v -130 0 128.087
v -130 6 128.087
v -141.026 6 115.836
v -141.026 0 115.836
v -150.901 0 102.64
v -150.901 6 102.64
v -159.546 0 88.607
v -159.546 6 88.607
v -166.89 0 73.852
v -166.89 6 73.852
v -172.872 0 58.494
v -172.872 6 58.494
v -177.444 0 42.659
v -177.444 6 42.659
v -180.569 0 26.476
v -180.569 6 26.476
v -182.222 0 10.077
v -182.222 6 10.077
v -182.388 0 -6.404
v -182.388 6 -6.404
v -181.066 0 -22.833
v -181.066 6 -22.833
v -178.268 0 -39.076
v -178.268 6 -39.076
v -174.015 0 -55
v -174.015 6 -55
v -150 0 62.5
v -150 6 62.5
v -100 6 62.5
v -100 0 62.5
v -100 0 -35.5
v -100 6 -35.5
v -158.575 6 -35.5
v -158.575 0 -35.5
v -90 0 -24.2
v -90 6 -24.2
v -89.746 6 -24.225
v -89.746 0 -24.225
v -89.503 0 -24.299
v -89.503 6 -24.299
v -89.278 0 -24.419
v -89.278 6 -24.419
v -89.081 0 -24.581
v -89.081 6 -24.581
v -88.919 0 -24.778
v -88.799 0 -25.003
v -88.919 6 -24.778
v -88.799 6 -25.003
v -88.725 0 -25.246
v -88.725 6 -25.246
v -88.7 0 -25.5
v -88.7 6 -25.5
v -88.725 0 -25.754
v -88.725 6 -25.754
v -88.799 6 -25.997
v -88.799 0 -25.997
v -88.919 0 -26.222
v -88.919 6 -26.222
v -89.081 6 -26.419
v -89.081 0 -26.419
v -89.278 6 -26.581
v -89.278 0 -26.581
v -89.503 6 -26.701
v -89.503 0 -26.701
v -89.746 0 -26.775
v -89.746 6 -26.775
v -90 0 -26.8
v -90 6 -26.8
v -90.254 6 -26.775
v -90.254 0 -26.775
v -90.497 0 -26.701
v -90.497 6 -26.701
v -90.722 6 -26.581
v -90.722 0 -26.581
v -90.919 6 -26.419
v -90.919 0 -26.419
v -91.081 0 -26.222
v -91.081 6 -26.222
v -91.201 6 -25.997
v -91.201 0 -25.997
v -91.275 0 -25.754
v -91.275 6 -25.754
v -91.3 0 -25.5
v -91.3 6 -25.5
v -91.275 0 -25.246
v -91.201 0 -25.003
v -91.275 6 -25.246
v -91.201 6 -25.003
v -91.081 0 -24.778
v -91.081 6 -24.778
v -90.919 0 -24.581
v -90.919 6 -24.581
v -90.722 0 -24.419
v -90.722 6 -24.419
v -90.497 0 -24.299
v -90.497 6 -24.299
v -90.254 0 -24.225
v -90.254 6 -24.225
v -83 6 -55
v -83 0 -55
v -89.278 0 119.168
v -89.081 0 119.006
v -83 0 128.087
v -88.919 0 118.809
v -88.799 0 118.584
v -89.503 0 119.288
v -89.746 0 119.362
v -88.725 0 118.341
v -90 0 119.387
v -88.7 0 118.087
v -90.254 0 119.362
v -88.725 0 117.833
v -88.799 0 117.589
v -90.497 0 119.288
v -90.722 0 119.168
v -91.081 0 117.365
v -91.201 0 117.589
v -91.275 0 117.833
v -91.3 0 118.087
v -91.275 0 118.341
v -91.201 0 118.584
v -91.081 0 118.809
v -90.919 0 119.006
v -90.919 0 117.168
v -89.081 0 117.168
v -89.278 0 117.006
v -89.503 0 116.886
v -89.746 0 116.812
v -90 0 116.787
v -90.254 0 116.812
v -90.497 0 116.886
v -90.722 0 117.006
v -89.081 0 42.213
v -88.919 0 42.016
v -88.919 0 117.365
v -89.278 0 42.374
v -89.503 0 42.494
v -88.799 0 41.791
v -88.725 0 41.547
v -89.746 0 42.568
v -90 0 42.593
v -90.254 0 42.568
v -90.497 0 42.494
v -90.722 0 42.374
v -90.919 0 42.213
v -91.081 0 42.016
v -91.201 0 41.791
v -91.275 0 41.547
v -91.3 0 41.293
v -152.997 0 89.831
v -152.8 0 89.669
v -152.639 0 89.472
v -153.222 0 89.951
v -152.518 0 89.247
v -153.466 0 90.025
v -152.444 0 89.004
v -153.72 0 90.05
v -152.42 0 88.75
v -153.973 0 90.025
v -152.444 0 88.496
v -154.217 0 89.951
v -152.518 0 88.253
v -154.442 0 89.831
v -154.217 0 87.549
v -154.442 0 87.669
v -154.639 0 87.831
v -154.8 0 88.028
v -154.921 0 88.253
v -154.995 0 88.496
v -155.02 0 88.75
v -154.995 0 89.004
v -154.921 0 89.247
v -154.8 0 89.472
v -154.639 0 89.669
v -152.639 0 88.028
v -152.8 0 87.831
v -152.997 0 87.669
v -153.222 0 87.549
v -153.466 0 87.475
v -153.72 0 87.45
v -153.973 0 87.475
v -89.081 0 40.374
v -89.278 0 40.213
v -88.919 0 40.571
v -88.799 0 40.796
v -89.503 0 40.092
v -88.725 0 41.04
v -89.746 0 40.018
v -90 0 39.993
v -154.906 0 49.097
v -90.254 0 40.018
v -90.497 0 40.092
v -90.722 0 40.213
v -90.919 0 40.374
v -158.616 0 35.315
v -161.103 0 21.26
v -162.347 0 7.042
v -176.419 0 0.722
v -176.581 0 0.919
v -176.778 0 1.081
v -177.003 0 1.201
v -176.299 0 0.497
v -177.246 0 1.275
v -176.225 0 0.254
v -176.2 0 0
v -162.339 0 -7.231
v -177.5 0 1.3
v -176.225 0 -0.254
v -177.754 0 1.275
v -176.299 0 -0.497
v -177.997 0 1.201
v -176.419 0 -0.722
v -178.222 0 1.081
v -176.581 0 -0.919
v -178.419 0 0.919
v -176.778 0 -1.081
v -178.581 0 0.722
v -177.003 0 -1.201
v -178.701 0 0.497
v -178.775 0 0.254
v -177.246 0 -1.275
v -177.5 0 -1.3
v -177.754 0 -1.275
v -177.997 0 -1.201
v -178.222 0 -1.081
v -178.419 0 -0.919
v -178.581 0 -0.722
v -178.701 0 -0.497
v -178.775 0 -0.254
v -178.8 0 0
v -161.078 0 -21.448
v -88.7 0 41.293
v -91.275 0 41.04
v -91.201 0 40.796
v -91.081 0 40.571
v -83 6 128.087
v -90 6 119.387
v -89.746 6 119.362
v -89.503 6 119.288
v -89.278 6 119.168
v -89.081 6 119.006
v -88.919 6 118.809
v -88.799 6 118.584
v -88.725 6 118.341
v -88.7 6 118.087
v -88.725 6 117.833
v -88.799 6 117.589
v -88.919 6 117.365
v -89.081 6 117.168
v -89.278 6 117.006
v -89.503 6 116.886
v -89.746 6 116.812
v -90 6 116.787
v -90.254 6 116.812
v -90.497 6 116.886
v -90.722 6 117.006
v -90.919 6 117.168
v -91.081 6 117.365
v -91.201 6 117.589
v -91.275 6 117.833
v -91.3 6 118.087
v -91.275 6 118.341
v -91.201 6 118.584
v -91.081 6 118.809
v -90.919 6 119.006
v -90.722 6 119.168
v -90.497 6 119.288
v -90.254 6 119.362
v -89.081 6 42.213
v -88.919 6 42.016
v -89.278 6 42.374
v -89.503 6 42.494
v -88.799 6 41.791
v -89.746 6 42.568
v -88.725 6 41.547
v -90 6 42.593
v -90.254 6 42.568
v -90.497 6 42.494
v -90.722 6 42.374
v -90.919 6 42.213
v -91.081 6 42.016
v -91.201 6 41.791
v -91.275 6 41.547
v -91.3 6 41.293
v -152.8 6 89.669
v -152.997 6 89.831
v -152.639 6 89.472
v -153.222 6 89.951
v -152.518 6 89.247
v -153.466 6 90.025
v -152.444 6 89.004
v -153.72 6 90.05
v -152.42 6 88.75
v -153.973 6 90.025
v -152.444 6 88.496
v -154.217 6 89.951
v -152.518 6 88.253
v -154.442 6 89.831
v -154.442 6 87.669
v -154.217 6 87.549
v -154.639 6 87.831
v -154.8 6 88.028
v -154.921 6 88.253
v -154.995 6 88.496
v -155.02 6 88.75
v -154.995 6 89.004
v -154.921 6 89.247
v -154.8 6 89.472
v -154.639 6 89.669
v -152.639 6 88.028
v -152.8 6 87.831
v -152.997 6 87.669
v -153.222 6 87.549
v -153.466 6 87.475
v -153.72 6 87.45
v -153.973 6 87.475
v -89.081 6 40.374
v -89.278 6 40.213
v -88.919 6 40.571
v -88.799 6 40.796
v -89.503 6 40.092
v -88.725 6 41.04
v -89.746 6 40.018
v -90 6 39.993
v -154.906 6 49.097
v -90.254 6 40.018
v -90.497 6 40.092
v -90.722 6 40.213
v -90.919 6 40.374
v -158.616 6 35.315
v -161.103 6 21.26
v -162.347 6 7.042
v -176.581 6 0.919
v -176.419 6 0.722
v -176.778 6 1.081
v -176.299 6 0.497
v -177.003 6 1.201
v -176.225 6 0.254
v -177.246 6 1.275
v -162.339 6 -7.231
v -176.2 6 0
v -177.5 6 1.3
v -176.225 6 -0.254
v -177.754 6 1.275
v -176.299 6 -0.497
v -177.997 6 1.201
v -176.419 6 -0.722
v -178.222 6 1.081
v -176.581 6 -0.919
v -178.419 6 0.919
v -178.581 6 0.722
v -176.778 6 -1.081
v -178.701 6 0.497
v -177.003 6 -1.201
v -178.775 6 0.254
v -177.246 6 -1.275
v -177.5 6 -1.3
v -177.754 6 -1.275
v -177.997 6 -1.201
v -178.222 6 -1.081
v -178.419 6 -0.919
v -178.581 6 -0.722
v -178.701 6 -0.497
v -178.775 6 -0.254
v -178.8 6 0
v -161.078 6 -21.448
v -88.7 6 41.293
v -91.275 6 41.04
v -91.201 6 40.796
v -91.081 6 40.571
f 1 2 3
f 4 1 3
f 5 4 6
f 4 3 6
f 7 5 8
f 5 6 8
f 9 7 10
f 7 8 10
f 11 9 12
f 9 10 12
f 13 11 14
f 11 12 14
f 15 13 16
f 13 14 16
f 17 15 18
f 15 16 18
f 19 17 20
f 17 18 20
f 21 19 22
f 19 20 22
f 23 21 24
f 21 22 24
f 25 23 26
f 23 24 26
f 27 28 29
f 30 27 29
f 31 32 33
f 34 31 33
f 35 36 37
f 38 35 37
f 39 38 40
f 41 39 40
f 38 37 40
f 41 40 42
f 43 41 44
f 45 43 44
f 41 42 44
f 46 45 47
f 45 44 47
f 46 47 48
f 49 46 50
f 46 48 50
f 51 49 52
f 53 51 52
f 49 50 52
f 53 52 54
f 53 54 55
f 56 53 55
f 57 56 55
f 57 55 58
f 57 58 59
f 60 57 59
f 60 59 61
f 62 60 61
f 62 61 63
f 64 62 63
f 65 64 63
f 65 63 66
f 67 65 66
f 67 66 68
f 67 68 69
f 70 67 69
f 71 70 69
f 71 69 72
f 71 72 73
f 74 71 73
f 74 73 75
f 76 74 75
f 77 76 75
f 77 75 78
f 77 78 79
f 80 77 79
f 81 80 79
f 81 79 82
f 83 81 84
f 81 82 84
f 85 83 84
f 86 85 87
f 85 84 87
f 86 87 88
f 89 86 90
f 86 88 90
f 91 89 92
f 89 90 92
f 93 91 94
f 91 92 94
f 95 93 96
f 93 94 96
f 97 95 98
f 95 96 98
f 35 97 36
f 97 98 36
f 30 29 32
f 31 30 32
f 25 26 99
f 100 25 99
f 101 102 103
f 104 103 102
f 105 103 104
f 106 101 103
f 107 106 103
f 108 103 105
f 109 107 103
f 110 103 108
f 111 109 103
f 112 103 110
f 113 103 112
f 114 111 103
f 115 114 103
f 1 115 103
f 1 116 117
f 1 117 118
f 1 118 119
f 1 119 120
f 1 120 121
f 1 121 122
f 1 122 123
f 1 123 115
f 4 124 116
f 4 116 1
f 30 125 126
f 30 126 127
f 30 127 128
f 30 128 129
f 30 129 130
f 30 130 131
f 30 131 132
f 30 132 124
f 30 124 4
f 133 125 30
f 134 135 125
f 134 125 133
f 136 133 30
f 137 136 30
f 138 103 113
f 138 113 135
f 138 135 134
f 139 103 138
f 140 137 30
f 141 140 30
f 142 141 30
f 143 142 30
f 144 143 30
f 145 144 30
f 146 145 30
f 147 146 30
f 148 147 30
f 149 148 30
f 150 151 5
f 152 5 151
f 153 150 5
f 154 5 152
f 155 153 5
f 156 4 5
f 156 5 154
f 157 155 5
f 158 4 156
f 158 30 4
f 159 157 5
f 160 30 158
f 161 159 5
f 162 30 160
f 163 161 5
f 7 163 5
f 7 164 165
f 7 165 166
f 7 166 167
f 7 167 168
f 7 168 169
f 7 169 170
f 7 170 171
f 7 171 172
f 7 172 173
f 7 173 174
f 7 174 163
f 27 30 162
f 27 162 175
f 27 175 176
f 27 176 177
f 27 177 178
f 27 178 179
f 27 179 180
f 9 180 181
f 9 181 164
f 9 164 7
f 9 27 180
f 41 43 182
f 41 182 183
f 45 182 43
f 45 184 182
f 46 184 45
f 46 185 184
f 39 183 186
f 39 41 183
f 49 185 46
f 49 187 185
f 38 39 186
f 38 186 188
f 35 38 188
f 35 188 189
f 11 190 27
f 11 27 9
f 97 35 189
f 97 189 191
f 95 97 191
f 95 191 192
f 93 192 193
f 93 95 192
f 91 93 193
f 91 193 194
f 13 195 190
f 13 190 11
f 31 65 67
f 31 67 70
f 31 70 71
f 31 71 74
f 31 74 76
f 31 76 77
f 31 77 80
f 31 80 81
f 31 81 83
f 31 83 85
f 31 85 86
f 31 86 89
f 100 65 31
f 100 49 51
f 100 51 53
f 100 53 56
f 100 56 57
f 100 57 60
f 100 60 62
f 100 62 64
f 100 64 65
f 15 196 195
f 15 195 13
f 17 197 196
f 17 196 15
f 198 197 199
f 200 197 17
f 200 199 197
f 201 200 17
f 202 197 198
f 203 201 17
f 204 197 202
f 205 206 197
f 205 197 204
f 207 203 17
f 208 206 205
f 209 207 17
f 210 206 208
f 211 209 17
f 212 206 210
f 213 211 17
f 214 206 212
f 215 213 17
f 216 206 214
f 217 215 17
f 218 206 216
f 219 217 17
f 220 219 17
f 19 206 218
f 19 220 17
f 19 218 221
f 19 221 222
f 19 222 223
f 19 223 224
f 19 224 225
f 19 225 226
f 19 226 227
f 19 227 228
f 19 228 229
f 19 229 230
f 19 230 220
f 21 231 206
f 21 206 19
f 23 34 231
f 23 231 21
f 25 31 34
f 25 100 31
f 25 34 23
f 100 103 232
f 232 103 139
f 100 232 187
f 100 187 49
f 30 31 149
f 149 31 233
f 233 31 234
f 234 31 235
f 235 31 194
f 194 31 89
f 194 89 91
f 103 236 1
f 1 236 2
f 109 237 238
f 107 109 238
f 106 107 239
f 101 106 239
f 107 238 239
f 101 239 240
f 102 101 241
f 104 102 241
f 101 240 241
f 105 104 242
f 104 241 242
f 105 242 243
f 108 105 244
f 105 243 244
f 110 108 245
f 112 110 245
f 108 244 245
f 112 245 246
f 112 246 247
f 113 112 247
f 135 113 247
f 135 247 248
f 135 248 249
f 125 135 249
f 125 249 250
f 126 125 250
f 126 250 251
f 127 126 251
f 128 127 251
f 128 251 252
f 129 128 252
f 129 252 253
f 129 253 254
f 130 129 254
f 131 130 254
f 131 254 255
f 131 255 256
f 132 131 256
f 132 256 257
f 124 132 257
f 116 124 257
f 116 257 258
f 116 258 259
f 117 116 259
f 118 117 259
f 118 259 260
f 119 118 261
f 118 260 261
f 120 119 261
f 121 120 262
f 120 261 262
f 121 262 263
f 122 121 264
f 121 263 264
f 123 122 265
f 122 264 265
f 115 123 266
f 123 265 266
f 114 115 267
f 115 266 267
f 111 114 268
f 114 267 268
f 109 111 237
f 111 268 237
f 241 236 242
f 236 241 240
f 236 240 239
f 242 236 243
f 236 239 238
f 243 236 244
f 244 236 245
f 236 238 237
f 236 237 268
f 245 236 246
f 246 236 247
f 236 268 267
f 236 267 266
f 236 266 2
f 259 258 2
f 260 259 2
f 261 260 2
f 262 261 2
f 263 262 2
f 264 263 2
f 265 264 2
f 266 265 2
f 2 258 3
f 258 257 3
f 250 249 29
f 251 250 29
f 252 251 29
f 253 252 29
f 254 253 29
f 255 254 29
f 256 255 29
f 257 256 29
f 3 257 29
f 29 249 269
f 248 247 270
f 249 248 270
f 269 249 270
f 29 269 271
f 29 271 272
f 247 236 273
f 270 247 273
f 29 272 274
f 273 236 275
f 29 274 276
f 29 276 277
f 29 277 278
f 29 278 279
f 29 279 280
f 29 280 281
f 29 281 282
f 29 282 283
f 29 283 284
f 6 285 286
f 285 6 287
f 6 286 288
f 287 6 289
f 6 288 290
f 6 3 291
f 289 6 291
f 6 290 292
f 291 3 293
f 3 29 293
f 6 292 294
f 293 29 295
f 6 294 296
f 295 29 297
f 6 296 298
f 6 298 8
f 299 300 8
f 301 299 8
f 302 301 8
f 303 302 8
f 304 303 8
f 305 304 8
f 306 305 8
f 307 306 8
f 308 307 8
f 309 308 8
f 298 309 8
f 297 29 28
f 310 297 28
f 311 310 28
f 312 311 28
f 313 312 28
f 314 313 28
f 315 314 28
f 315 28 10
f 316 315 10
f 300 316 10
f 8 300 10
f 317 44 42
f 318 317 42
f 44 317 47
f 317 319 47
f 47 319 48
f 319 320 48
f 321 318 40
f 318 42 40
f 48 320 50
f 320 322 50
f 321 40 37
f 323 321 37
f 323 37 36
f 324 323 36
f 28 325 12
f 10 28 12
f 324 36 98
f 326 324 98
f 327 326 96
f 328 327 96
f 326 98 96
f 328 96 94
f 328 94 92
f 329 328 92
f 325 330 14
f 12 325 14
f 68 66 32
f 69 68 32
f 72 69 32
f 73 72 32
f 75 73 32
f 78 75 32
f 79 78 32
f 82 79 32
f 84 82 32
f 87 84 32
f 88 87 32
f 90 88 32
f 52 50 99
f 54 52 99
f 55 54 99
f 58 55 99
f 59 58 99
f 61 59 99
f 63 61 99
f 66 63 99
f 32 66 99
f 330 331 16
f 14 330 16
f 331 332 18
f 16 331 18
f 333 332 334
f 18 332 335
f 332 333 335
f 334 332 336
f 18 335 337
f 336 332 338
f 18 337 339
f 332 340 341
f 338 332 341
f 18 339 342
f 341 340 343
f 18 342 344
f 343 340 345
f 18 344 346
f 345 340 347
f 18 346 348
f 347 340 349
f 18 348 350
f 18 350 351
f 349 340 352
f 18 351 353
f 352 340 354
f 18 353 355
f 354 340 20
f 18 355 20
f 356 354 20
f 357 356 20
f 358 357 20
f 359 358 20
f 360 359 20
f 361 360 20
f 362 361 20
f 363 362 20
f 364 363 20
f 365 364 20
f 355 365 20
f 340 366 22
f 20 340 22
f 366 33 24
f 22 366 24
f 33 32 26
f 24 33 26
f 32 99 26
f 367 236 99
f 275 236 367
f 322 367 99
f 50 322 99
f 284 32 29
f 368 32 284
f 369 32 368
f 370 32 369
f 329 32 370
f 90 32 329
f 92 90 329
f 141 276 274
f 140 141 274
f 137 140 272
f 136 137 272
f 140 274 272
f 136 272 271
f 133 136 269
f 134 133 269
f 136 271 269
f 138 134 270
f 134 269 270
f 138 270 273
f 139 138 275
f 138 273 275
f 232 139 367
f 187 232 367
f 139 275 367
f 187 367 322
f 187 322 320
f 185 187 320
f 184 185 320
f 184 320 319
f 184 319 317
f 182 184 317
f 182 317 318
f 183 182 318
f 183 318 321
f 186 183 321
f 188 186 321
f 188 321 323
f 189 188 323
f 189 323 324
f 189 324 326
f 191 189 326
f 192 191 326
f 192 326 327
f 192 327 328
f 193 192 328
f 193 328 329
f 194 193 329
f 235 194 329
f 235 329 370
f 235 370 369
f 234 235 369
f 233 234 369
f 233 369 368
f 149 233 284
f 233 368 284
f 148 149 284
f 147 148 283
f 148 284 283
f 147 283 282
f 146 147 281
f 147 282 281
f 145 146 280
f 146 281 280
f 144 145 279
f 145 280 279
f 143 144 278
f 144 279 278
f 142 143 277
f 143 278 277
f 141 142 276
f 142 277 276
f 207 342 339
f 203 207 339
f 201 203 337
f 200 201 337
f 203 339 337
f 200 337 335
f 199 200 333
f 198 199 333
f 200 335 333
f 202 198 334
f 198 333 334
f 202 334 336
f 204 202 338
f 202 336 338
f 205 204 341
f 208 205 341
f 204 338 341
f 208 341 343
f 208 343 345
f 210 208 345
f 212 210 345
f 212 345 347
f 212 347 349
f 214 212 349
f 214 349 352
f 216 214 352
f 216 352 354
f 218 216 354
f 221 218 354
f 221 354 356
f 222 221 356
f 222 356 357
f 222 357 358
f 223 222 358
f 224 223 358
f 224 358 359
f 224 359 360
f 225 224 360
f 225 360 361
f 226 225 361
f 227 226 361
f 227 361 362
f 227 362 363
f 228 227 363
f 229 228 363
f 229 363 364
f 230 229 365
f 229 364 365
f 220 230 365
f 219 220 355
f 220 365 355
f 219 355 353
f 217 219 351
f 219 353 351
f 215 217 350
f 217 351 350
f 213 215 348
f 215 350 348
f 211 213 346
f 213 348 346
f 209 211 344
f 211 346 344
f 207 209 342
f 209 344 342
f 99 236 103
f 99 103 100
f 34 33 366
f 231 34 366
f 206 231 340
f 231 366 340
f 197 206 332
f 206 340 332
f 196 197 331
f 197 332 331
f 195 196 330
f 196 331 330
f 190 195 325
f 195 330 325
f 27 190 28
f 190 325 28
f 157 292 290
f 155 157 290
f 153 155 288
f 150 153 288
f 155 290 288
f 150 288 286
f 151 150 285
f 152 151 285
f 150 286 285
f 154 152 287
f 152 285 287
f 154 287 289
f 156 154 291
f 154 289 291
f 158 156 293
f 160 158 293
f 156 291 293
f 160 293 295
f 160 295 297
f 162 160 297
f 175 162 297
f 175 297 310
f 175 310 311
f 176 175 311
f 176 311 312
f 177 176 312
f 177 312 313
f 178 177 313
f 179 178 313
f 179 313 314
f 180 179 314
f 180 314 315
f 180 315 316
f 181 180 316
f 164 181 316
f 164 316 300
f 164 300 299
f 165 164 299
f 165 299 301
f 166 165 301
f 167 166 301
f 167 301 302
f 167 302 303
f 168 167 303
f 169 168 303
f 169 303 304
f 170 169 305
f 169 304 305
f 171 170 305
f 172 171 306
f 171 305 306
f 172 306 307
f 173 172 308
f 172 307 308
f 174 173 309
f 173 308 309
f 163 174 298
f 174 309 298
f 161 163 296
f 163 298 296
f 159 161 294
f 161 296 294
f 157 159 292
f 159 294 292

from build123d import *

# Parameters (mm, degrees)
BOSS_EXTRUDE1_DEPTH = 6
SKETCH5_W           = 200
SKETCH5_H           = 20
BOSS_EXTRUDE2_DEPTH = 6
SKETCH6_W           = 86.5
SKETCH6_H           = 143.586884574
BOSS_EXTRUDE3_DEPTH = 6
CUT_EXTRUDE3_DEPTH  = 230.888016217
CUT_EXTRUDE4_DEPTH  = 228.130469114
SKETCH9_W           = 210
SKETCH9_H           = 52
CUT_EXTRUDE5_DEPTH  = 226.140511681
BOSS_EXTRUDE4_DEPTH = 6
FILLET1_R           = 10
SKETCH11_R          = 1.3
CUT_EXTRUDE6_DEPTH  = 259.163707751
SKETCH12_R          = 1.3
CUT_EXTRUDE7_DEPTH  = 259.163707751
SKETCH13_R          = 1.75
CUT_EXTRUDE8_DEPTH  = 10
CUT_EXTRUDE9_DEPTH  = 259.163707751
SKETCH15_R          = 208.652698437
CUT_EXTRUDE10_DEPTH = 259.163707751


with BuildPart() as part:
    # Sketch2 → Boss-Extrude1 (new body)
    with BuildSketch(Plane(origin=(0, 0, 0), x_dir=(1, 0, 0), z_dir=(0, 1, 0))):
        with BuildLine():
            Line((-100, -128.086884574), (-100, 35.5))
            Line((-100, 35.5), (100, 35.5))
            Line((100, 35.5), (100, -128.086884574))
            ThreePointArc((100, -128.086884574), (0, 162.5), (-100, -128.086884574))
        make_face()
    extrude(amount=BOSS_EXTRUDE1_DEPTH)

    # Sketch5 → Boss-Extrude2 (add)
    with BuildSketch(Plane(origin=(0, 6, 0), x_dir=(1, 0, 0), z_dir=(0, 1, 0))):
        with Locations((0, -118.086884574)):
            Rectangle(SKETCH5_W, SKETCH5_H)
    extrude(amount=-BOSS_EXTRUDE2_DEPTH)

    # Sketch6 → Boss-Extrude3 (add, through all)
    with BuildSketch(Plane(origin=(0, 6, 0), x_dir=(1, 0, 0), z_dir=(0, 1, 0))):
        with Locations((-56.75, -36.293442287)):
            Rectangle(SKETCH6_W, SKETCH6_H)
        with Locations((56.75, -36.293442287)):
            Rectangle(SKETCH6_W, SKETCH6_H)
    extrude(amount=-BOSS_EXTRUDE3_DEPTH)

    # Sketch7 → Cut-Extrude3 (cut, through all)
    with BuildSketch(Plane(origin=(0, 6, 0), x_dir=(1, 0, 0), z_dir=(0, 1, 0))):
        with BuildLine():
            Line((-150, -62.5), (-100, -62.5))
            Line((-100, -62.5), (-100, 35.5))
            Line((-100, 35.5), (-158.574903437, 35.5))
            ThreePointArc((-158.574903437, 35.5), (-161.881492944, -14.164471125), (-150, -62.5))
        make_face()
        with BuildLine():
            Line((100, 35.5), (100, -62.5))
            Line((100, -62.5), (150, -62.5))
            ThreePointArc((150, -62.5), (161.881492944, -14.164471125), (158.574903437, 35.5))
            Line((158.574903437, 35.5), (100, 35.5))
        make_face()
    extrude(amount=-CUT_EXTRUDE3_DEPTH, mode=Mode.SUBTRACT)

    # Sketch8 → Cut-Extrude4 (cut, through all)
    with BuildSketch(Plane(origin=(0, 6, 0), x_dir=(1, 0, 0), z_dir=(0, 1, 0))):
        with BuildLine():
            Line((-30, 132.5), (-30, 159.706762537))
            ThreePointArc((-30, 159.706762537), (0, 162.5), (30, 159.706762537))
            Line((30, 159.706762537), (30, 132.5))
            ThreePointArc((30, 132.5), (0, 102.5), (-30, 132.5))
        make_face()
    extrude(amount=-CUT_EXTRUDE4_DEPTH, mode=Mode.SUBTRACT)

    # Sketch9 → Cut-Extrude5 (cut, through all)
    with BuildSketch(Plane(origin=(0, 6, 0), x_dir=(1, 0, 0), z_dir=(0, 1, 0))):
        with Locations((0, 81)):
            Rectangle(SKETCH9_W, SKETCH9_H)
    extrude(amount=-CUT_EXTRUDE5_DEPTH, mode=Mode.SUBTRACT)

    # Sketch10 → Boss-Extrude4 (add, through all)
    with BuildSketch(Plane(origin=(0, 6, 0), x_dir=(1, 0, 0), z_dir=(0, 1, 0))):
        with BuildLine():
            Line((-100, -128.086884574), (-130, -128.086884574))
            ThreePointArc((-130, -128.086884574), (0, 182.5), (130, -128.086884574))
            Line((130, -128.086884574), (100, -128.086884574))
            ThreePointArc((100, -128.086884574), (0, 162.5), (-100, -128.086884574))
        make_face()
    extrude(amount=-BOSS_EXTRUDE4_DEPTH)

    # Fillet1
    fillet1_edges = [part.edges().sort_by_distance(p)[0] for p in [
        (-105, 3, -107),
        (105, 3, -107),
        (105, 3, -55),
        (-105, 3, -55),
    ]]
    fillet(fillet1_edges, radius=FILLET1_R)

    # Sketch11 → Cut-Extrude6 (cut, through all)
    with BuildSketch(Plane(origin=(0, 6, 0), x_dir=(1, 0, 0), z_dir=(0, 1, 0))):
        with Locations(Location((0, 177.5, 0), (0, 0, 270))):
            Circle(SKETCH11_R)
        with Locations(Location((88.75, 153.719509172, 0), (0, 0, 270))):
            Circle(SKETCH11_R)
        with Locations(Location((153.719509172, 88.75, 0), (0, 0, 270))):
            Circle(SKETCH11_R)
        with Locations(Location((177.5, 0, 0), (0, 0, 270))):
            Circle(SKETCH11_R)
        with Locations(Location((153.719509172, -88.75, 0), (0, 0, 270))):
            Circle(SKETCH11_R)
        with Locations((88.75, -153.719509172)):
            Circle(SKETCH11_R)
        with Locations((0, -177.5)):
            Circle(SKETCH11_R)
        with Locations((-88.75, -153.719509172)):
            Circle(SKETCH11_R)
        with Locations(Location((-153.719509172, -88.75, 0), (0, 0, 270))):
            Circle(SKETCH11_R)
        with Locations(Location((-177.5, 0, 0), (0, 0, 270))):
            Circle(SKETCH11_R)
        with Locations(Location((-153.719509172, 88.75, 0), (0, 0, 270))):
            Circle(SKETCH11_R)
        with Locations(Location((-88.75, 153.719509172, 0), (0, 0, 270))):
            Circle(SKETCH11_R)
    extrude(amount=-CUT_EXTRUDE6_DEPTH, mode=Mode.SUBTRACT)

    # Sketch12 → Cut-Extrude7 (cut, through all)
    with BuildSketch(Plane(origin=(0, 6, 0), x_dir=(1, 0, 0), z_dir=(0, 1, 0))):
        with Locations(Location((0, -118.086884574, 0), (0, 0, 270))):
            Circle(SKETCH12_R)
        with Locations(Location((-90, -118.086884574, 0), (0, 0, 270))):
            Circle(SKETCH12_R)
        with Locations(Location((90, -118.086884574, 0), (0, 0, 270))):
            Circle(SKETCH12_R)
        with Locations(Location((-90, 25.5, 0), (0, 0, 270))):
            Circle(SKETCH12_R)
        with Locations(Location((-90, -41.293442287, 0), (0, 0, 270))):
            Circle(SKETCH12_R)
        with Locations(Location((90, -41.293442287, 0), (0, 0, 90))):
            Circle(SKETCH12_R)
        with Locations(Location((90, 25.5, 0), (0, 0, 90))):
            Circle(SKETCH12_R)
    extrude(amount=-CUT_EXTRUDE7_DEPTH, mode=Mode.SUBTRACT)

    # Sketch13 → Cut-Extrude8 (cut)
    with BuildSketch(Plane(origin=(0, 6, 0), x_dir=(1, 0, 0), z_dir=(0, 1, 0))):
        with Locations(Location((-17.875, -13.5, 0), (0, 0, 270))):
            Circle(SKETCH13_R)
        with Locations(Location((17.875, -13.5, 0), (0, 0, 270))):
            Circle(SKETCH13_R)
    extrude(amount=-CUT_EXTRUDE8_DEPTH, mode=Mode.SUBTRACT)

    # Sketch14 → Cut-Extrude9 (cut, through all)
    with BuildSketch(Plane(origin=(0, 6, 0), x_dir=(1, 0, 0), z_dir=(0, 1, 0))):
        with BuildLine():
            Line((-30, 132.5), (30, 132.5))
            ThreePointArc((30, 132.5), (37.46877708, 114.46877708), (55.5, 107))
            Line((55.5, 107), (-55.5, 107))
            ThreePointArc((-55.5, 107), (-37.46877708, 114.46877708), (-30, 132.5))
        make_face()
    extrude(amount=-CUT_EXTRUDE9_DEPTH, mode=Mode.SUBTRACT)

    # Sketch15 → Cut-Extrude10 (cut, through all)
    with BuildSketch(Plane(origin=(0, 6, 0), x_dir=(1, 0, 0), z_dir=(0, 1, 0))):
        Circle(SKETCH15_R)
        with BuildLine():
            Line((-95, 55), (-174.015085553, 55))
            ThreePointArc((-174.015085553, 55), (-177.444343068, -42.658587802), (-130, -128.086884574))
            Line((-130, -128.086884574), (-83, -128.086884574))
            Line((-83, -128.086884574), (-83, 55))
            Line((-83, 55), (-95, 55))
        make_face(mode=Mode.SUBTRACT)
    extrude(amount=-CUT_EXTRUDE10_DEPTH, mode=Mode.SUBTRACT)


solid = part.part
